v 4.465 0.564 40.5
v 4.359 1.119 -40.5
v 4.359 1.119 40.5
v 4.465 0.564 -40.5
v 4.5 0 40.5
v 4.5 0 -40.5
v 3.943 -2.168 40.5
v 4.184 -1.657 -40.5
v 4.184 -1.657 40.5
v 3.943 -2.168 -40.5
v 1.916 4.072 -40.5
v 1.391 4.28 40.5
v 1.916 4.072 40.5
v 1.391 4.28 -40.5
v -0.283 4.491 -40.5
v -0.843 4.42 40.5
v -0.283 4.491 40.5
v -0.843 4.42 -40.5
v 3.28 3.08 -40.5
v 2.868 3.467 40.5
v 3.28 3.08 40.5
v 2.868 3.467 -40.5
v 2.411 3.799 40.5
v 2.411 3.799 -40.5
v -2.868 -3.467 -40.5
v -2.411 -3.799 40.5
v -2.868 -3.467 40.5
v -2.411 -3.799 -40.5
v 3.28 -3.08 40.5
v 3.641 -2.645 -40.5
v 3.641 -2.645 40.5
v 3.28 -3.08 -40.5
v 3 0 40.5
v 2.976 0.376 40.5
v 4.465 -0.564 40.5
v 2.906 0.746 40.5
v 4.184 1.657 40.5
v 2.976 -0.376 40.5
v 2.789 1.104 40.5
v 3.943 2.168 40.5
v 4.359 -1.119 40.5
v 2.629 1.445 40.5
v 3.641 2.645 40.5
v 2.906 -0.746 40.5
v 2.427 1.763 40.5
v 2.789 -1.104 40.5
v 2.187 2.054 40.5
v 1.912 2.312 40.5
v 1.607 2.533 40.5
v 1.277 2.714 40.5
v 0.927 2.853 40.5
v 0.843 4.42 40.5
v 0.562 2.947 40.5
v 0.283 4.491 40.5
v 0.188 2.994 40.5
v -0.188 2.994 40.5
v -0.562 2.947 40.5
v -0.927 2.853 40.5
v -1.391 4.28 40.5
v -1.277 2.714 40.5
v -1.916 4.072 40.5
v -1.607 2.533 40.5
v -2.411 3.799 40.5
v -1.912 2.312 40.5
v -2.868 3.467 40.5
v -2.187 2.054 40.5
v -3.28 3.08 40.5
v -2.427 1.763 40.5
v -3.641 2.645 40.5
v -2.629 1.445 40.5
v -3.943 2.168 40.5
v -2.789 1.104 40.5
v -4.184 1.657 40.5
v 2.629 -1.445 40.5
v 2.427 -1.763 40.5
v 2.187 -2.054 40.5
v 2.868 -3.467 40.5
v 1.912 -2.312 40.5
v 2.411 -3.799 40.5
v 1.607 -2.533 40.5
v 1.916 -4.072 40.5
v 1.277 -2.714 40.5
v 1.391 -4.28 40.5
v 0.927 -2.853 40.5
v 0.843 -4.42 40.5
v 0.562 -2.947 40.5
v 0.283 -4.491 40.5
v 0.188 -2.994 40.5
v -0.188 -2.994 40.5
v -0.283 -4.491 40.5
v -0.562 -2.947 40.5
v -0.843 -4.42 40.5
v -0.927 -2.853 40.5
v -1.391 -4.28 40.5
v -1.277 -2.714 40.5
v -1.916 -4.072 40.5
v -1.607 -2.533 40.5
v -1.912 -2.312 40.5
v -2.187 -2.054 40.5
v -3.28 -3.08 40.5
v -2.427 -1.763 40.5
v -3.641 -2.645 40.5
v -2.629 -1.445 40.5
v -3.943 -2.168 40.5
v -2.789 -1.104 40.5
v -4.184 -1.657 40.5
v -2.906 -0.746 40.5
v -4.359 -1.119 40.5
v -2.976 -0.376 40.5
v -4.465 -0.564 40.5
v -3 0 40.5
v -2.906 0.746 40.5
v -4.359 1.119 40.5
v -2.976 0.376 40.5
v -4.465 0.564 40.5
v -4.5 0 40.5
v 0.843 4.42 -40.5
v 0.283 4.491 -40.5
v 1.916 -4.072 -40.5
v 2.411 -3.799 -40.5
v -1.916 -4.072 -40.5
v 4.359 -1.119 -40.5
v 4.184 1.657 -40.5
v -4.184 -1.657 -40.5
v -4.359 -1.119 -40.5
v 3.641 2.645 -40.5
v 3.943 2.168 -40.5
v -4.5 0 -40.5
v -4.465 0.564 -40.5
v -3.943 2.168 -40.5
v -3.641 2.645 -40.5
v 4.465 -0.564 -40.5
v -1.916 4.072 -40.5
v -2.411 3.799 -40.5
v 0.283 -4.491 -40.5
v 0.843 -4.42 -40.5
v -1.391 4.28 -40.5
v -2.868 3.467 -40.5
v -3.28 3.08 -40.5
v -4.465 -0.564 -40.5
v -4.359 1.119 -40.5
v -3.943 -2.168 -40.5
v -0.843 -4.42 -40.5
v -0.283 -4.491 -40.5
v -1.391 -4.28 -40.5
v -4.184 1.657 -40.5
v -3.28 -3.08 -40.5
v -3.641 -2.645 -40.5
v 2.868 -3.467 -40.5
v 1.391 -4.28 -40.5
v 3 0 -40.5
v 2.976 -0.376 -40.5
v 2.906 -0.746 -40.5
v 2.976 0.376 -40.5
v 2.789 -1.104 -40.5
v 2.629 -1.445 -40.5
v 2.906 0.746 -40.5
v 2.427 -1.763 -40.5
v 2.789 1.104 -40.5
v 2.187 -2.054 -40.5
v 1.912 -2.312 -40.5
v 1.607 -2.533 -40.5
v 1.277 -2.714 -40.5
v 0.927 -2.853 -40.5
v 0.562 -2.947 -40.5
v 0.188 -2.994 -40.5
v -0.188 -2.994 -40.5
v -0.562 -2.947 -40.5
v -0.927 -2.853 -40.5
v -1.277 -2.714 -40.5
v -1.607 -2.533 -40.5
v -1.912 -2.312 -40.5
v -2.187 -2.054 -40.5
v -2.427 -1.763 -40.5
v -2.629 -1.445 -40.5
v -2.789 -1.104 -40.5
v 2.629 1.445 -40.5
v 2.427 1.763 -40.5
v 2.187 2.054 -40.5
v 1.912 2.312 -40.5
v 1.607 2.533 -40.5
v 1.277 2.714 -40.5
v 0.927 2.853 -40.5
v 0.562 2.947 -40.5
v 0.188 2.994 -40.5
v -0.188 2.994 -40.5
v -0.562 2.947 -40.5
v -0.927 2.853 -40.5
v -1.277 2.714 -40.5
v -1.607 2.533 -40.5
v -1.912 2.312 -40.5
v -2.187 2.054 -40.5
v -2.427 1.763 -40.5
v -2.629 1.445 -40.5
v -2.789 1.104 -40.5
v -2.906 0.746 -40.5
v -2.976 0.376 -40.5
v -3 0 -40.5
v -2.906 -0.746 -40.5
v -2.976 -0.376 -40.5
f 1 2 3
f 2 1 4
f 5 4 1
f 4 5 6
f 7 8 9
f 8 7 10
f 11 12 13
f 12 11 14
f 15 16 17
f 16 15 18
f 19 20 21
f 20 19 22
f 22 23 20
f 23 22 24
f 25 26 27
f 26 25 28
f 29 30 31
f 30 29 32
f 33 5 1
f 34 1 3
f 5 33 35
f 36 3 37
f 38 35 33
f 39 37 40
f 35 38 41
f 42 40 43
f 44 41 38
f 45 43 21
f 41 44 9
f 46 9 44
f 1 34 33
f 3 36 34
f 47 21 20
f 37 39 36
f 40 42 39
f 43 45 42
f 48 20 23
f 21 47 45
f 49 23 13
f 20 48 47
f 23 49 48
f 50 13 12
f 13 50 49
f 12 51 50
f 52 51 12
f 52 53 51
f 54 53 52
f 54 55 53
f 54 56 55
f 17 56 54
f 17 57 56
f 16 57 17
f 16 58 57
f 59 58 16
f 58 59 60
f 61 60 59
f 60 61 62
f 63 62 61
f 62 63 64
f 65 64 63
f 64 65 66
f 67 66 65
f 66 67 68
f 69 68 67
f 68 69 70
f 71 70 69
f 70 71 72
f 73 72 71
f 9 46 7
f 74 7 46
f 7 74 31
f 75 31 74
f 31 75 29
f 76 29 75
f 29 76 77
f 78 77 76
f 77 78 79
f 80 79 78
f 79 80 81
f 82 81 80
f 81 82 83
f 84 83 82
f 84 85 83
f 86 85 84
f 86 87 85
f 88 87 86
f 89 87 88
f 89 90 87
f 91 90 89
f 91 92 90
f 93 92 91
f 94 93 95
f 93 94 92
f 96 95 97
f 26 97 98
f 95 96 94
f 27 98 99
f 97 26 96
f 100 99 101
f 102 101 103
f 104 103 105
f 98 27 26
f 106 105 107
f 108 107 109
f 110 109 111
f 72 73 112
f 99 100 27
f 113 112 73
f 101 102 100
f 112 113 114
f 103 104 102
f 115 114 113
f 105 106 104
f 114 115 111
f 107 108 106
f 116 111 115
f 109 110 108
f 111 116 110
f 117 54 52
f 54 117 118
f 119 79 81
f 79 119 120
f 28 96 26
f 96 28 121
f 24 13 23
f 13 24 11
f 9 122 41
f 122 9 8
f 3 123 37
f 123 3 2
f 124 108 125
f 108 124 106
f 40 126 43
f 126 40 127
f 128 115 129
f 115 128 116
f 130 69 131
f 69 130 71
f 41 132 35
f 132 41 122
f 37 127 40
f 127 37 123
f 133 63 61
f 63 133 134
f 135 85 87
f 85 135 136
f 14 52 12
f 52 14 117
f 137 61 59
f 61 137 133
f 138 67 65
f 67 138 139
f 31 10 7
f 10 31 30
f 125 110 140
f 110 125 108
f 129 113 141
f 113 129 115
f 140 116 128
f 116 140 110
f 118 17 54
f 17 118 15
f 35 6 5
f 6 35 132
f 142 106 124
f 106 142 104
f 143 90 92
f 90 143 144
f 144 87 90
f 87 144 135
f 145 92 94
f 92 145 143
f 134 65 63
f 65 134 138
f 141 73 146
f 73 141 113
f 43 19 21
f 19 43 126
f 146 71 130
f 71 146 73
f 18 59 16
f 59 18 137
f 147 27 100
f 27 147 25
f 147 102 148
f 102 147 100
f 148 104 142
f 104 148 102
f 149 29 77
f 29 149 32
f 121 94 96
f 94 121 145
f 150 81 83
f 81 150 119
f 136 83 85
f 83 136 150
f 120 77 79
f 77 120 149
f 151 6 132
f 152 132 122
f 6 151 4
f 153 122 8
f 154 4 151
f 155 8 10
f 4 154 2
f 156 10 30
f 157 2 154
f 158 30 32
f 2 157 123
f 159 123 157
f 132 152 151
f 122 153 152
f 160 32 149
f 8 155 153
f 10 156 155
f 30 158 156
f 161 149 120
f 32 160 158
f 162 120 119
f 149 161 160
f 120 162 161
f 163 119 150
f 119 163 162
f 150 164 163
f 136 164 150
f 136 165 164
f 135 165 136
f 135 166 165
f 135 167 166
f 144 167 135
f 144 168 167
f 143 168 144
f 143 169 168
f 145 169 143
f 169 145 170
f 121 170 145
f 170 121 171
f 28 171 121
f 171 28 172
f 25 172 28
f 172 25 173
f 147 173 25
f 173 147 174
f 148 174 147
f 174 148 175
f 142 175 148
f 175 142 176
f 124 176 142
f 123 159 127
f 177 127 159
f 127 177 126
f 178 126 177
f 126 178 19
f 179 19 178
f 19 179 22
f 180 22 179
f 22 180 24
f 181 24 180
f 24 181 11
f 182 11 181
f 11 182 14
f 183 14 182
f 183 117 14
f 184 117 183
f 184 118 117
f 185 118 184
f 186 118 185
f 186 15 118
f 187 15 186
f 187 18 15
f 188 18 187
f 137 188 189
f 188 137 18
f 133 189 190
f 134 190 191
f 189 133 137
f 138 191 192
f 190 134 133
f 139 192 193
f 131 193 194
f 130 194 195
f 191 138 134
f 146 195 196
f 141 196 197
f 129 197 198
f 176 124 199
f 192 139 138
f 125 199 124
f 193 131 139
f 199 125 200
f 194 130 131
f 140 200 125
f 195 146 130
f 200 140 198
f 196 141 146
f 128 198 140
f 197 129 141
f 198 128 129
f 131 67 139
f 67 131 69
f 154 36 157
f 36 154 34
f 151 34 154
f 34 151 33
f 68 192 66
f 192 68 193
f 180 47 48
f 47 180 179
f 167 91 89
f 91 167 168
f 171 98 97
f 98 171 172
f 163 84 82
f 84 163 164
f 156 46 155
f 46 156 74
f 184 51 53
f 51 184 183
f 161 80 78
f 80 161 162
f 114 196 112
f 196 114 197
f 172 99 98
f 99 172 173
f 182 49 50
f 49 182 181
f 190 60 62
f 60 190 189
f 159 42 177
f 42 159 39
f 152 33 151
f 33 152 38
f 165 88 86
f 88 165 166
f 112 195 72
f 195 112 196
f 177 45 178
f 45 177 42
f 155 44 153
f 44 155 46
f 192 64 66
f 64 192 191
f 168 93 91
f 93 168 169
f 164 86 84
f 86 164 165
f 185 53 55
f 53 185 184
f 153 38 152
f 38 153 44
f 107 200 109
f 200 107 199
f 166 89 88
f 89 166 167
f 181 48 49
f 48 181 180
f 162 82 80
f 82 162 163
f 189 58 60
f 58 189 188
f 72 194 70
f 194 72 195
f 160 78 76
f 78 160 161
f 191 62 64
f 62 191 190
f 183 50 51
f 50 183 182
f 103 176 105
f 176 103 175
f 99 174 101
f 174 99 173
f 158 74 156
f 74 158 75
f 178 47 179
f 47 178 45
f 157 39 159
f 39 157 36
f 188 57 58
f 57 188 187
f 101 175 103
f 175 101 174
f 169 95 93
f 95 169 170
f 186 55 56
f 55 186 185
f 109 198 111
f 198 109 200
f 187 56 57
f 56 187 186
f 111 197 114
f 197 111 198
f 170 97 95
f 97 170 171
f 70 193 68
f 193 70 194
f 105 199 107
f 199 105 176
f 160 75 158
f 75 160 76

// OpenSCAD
$fn = 50;


difference() {
	union() {
		translate(v = [0, 0, -40.5000000000]) {
			cylinder(h = 81, r = 4.5000000000);
		}
	}
	union() {
		translate(v = [0, 0, -100.0000000000]) {
			cylinder(h = 200, r = 3.0000000000);
		}
	}
}
